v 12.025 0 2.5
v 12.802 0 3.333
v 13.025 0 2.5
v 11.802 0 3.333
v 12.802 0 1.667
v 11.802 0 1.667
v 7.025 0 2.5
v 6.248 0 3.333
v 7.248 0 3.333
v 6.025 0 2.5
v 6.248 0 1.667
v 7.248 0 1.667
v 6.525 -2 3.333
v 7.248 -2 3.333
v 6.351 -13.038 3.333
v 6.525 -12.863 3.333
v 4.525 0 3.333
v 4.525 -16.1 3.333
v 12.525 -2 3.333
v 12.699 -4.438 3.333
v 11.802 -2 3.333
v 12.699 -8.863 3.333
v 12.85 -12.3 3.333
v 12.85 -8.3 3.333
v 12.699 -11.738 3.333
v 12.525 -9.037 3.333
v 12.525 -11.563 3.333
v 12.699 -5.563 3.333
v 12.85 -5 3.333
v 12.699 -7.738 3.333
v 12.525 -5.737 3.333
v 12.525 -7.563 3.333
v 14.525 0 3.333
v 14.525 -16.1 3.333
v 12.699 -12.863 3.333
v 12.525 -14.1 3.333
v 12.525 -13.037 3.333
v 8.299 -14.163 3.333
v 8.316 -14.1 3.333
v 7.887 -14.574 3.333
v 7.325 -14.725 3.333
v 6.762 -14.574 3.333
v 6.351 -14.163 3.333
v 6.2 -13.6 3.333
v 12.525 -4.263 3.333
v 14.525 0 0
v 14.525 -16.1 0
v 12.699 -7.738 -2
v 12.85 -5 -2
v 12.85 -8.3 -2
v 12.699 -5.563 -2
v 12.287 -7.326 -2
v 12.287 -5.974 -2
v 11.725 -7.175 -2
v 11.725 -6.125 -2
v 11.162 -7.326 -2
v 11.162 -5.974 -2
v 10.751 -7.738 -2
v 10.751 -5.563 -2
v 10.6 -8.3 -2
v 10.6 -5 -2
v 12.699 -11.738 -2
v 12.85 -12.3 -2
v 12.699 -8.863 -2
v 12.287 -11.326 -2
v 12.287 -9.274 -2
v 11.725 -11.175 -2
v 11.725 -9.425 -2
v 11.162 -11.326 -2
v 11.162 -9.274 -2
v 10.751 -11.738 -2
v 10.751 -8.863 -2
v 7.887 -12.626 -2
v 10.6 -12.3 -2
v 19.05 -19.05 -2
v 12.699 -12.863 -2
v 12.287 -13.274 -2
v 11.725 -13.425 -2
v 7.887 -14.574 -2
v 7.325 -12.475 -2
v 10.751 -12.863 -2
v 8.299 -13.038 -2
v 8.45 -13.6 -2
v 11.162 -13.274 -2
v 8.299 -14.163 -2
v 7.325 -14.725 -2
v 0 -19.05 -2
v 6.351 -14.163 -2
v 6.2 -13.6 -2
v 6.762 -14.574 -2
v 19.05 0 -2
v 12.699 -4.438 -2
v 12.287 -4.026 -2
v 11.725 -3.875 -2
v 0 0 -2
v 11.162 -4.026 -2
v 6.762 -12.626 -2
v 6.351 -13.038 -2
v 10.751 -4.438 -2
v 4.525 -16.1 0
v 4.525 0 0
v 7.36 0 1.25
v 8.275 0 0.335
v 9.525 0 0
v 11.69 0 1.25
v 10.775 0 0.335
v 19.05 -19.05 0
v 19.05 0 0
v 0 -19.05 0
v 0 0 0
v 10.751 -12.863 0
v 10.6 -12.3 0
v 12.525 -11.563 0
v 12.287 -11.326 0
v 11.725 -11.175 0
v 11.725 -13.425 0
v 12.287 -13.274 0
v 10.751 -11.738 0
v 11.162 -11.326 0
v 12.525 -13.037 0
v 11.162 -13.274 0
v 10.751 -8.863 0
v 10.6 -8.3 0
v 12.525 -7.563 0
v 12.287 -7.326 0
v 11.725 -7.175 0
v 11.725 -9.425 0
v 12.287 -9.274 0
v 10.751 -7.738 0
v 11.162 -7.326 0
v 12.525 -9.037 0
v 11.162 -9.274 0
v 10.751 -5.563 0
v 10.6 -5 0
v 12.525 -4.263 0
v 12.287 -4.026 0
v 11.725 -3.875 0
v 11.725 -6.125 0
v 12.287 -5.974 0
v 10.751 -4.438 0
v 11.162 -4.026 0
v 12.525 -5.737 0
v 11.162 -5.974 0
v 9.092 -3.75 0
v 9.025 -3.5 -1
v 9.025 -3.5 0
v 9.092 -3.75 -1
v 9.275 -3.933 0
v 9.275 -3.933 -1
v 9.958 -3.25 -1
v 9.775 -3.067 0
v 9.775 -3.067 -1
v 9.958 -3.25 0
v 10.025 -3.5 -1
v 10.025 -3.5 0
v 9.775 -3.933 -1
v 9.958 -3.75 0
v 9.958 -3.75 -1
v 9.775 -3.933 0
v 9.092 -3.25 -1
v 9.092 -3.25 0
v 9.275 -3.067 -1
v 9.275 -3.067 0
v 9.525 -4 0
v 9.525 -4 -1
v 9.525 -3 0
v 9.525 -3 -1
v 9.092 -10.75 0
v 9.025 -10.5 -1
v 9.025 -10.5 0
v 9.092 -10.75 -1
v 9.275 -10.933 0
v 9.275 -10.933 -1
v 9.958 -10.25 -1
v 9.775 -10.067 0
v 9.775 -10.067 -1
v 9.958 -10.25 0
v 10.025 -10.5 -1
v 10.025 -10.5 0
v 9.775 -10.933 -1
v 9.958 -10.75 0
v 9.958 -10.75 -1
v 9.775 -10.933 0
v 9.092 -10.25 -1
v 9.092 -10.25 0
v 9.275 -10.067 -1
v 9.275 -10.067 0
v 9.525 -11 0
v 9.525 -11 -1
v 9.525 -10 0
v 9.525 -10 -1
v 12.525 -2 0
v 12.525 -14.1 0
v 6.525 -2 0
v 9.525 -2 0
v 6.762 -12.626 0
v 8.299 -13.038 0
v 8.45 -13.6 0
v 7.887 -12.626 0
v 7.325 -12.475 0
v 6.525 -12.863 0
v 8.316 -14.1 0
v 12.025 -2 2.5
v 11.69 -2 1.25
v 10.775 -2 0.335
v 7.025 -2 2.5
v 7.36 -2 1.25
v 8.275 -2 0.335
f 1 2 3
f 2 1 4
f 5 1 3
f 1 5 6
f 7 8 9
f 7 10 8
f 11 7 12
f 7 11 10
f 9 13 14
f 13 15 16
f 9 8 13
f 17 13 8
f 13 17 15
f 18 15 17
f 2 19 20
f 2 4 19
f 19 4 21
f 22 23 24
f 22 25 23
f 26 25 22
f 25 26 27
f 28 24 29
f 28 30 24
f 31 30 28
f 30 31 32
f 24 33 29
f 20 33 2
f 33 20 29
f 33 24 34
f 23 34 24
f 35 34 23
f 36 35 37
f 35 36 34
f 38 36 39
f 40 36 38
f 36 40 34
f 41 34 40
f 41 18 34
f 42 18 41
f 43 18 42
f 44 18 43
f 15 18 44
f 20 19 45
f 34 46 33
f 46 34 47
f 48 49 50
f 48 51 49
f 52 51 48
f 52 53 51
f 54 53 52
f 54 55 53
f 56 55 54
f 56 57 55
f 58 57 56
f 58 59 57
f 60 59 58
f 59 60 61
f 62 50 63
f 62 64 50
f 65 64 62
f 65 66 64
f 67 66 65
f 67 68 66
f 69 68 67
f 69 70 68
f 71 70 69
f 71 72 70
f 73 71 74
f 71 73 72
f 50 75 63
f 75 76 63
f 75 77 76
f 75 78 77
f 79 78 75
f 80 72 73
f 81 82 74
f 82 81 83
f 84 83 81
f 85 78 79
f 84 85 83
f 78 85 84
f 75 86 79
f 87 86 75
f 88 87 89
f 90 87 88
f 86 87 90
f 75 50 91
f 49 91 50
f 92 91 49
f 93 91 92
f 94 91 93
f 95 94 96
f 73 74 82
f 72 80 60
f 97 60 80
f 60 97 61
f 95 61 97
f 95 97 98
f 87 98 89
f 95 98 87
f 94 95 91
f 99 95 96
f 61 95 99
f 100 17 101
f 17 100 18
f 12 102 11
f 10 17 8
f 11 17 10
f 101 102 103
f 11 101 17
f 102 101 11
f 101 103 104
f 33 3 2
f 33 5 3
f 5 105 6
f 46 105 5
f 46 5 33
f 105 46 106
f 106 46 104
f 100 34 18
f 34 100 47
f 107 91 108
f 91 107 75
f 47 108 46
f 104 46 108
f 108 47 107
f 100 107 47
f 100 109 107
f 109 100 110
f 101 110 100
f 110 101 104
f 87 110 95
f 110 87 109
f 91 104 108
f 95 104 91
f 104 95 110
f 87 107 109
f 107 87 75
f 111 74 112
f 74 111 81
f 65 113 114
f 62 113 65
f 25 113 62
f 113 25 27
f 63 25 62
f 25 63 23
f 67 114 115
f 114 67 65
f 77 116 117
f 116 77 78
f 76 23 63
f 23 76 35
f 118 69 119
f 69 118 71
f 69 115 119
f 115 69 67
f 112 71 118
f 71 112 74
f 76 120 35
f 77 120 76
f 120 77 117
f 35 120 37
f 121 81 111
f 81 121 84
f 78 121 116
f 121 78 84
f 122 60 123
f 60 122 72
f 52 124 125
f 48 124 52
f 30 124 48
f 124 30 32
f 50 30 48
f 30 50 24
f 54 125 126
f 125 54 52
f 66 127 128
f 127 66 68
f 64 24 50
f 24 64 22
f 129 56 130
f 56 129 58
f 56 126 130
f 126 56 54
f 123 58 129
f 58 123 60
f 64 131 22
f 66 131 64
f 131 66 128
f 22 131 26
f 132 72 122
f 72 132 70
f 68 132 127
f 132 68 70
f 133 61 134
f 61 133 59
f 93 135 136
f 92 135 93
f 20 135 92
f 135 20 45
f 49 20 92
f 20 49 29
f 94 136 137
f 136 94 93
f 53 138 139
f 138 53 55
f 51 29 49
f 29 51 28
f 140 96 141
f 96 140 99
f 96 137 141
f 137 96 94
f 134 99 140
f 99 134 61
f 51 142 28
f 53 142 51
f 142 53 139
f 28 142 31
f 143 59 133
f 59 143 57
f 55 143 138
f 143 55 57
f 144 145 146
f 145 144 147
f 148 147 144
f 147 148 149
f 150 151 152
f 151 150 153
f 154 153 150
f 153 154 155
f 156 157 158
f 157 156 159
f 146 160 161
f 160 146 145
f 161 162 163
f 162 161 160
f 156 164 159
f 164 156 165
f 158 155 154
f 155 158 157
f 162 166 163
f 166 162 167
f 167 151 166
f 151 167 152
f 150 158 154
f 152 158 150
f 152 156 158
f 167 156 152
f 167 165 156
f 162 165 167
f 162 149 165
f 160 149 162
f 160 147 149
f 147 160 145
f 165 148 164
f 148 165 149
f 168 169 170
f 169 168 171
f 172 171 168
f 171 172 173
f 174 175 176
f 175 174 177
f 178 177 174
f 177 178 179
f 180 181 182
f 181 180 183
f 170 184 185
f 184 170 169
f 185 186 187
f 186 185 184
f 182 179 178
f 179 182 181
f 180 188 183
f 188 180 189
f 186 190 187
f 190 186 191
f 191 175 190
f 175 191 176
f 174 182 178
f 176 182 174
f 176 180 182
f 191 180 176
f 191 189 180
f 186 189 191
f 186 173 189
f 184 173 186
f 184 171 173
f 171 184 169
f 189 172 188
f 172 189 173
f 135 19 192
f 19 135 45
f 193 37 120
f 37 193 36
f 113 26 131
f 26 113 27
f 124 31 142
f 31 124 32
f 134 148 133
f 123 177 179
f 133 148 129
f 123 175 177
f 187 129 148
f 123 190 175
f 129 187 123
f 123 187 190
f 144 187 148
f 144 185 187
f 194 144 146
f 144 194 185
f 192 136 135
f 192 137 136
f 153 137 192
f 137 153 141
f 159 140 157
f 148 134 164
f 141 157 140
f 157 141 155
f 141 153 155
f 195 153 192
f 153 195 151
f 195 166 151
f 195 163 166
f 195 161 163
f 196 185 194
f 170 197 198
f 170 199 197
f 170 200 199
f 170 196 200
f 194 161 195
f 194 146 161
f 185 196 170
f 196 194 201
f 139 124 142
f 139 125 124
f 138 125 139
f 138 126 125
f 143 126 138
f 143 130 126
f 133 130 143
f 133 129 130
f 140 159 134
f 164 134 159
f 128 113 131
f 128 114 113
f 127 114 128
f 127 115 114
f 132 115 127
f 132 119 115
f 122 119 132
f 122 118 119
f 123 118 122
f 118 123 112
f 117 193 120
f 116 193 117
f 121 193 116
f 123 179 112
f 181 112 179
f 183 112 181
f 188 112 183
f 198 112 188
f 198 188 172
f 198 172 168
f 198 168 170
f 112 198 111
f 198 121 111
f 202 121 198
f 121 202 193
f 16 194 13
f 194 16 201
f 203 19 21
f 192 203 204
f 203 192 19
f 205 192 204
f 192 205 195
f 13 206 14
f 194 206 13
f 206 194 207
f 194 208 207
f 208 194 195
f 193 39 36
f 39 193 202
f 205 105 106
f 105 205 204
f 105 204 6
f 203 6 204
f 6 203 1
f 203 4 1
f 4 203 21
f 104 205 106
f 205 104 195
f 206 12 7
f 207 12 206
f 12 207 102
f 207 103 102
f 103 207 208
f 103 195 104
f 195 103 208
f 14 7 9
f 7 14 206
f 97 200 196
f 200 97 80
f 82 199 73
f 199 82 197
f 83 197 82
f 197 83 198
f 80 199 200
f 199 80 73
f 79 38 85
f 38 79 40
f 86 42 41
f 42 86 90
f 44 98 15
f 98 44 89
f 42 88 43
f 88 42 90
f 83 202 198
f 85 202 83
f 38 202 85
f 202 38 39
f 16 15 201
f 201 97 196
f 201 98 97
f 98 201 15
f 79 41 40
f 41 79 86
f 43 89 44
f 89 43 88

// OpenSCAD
// file: stabilizer_spacing.scad
include <parameters.scad>

// Stabilizer spacing for common key sizes, measured center-to-center
// Format is [key_size, left_offset, right_offset, switch_offset=0]
// Key size is measured in units, offsets are measured in mm from center

stab_2u = [2, 5/8*unit, 5/8*unit];  // [11.938, 11.938], 1.25u total spacing
stab_2_25u = [2.25, 5/8*unit, 5/8*unit];
stab_2_5u = [2.5, 5/8*unit, 5/8*unit];
stab_2_75u = [2.75, 5/8*unit, 5/8*unit];
stab_3u = [3, 1*unit, 1*unit];  // [19.05, 19.05], 2u total spacing
stab_6u = [6, 2.5*unit, 2.5*unit];  // [47.625, 47.625], 5u total spacing
stab_6u_offset = [6, 3*unit, 2*unit, 0.5*unit];  // [57.15, 38.1], 5u total spacing
stab_6_25u = [6.25, 2.625*unit, 2.625*unit];  // [49.8475, 49.8475], 5.25u total spacing
stab_6_25u_offset = [6.25, 3.25*unit, 2*unit, 0.625*unit];  // [61.9125, 38.1], 5.25u total spacing
stab_6_25u_narrow = [6.25, 40, 40];  // 80mm total spacing
stab_7u = [7, 3*unit, 3*unit];  // [57.15, 57.15]
// file: layout.scad
include <parameters.scad>
include <stabilizer_spacing.scad>

/* [Layout Values] */
/* Layout Format (each key):
    [
        [                                       // Location Data
            [x_location, y_location],
            key_size,
            [rotation, rotation_x, rotation_y],
        ],
        [                                       // Borders
            top_border,
            bottom_border,
            left_border,
            right_border
        ],
        extra_data                              // Extra data (depending on component type)
    ]
*/

// Keyswitch Layout
//     (extra_data = rotate_column)
base_switch_layout = [
  [[[2,0],1,[0,0,0]],[0,1,1,1],false],
  [[[1,0.13],1,[0,0,0]],[0,1,1,1],false],
  [[[3,0.13],1,[0,0,0]],[0,1,1,1],false],
  [[[4,0.25],1,[0,0,0]],[0,1,1,1],false],
  [[[0,0.38],1,[0,0,0]],[0,1,0,1],false],
  [[[2,1],1,[0,0,0]],[1,1,1,1],false],
  [[[1,1.13],1,[0,0,0]],[1,1,1,1],false],
  [[[3,1.13],1,[0,0,0]],[1,1,1,1],false],
  [[[4,1.25],1,[0,0,0]],[1,1,1,1],false],
  [[[0,1.38],1,[0,0,0]],[1,1,0,1],false],
  [[[2,2],1,[0,0,0]],[1,4,1,1],false],
  [[[1,2.13],1,[0,0,0]],[1,3,1,1],false],
  [[[3,2.13],1,[0,0,0]],[1,3,1,1],false],
  [[[4,2.25],1,[0,0,0]],[1,2,1,1],false],
  [[[0,2.38],1,[0,0,0]],[1,1,0,1],false],
  //[[[5,2.75],1,[0,0,0]],[1,2,2,1],false],
  [[[5,3.6],1,[-30,6.5,4.25]],[3.5,1,3,1],false],
  [[[4,4.6],1,[-30,6.5,4.25]],[3.5,0,3,1],false],
  [[[5,4.6],1,[-30,6.5,4.25]],[4.2,0,1,1],false],
  [[[6,4.6],1,[-30,6.5,4.25]],[1  ,0,1,0],false],
];


// MCU Position(s)
base_mcu_layout = [
    [[[5.1,0.51],1.5,[0,0,0]],[0,42.5,3,1],false],
	//[[[-4.5,1.6],1.5,[90,0,0]],[14,6,0,0],false]
];

// TRRS Position(s)
base_trrs_layout = [ 	              
   /* //[[[5,0.5],1,[0,0,0]],[0,0,0,0]], */
   [[[6.4,3.35],1,[-90,7,3]],[0,0,0,0]],
];

base_typec_layout = [ 	              
   //[[[5,0.5],1,[0,0,0]],[0,0,0,0]],
   [[[6.4,3.35],1,[-90,7,3]],[0,0,0,0]],
];

// Stabilizer layout
//     (extra_data = [key_size, left_offset, right_offset, switch_offset=0])
//     (see stabilizer_spacing.scad for presets)
base_stab_layout = [];

// Via layout
//     (extra_data = [via_width, via_length])
base_via_layout = [
    [[[4.55, 1.95]]],
    [[[4.55, 0.95]]],
    [[[4.55, 0.0]]],

    [[[4.8, 2.6]]],
];

// Plate Layout (if different than PCB)
//     (extra_data = component_type)
base_plate_layout = [];

// Whether to only use base_plate_layout to generate the plate footprint
use_plate_layout_only = false;

// Standoff layout
//     (extra_data = [standoff_integration_override, standoff_attachment_override])
base_standoff_layout = [
    [[[0.5,0.125]]], // original
    [[[0.5,2.2]]], // original
    [[[2.5,1]]], // original
    [[[4.5,0.5]]], // original
    [[[5.8,3.7]]], // original

    /* [[[0.5, 0.2]]], // new */
    /* [[[2.5, 0.0]]], // new -- */
    /* [[[4.5, 0.2]]], // new */

    /* [[[0.5, 1.3]]], // new -- */
    /* [[[2.5,1.0]]], // new -- */
    /* [[[4.5,1.3]]], // new -- */

    /* [[[0.5, 2.6]]], // new */
    /* [[[2.5,2.4]]], // new -- */
    /* [[[4.5,2.7]]], // new -- */

    /* [[[5.4, 3.8]]], // new */
    /* [[[4.0, 4.2]]], // new -- */

    // PCB-Backplate standoffs
    /* [[[-0.5,-0.375]],[0,0,0,0],["plate", "backplate"]], */
    /* [[[-0.5,0]],[0,0,0,0],["plate", "backplate"]], */
    [[[-0.5,0]],[0,0,0,0],["plate", "backplate"]],
    [[[-0.5,3]],[0,0,0,0],["plate", "backplate"]],
    [[[6.2,-0.04]],[0,0,0,0],["plate", "backplate"]],
    [[[6.2,3.5]],[0,0,0,0],["plate", "backplate"]],
    [[[3,4.1]],[0,0,0,0],["plate", "backplate"]],
    /* [[[-0.5,3.625]],[0,0,0,0],["plate", "backplate"]], */
    /* [[[4,3.625]],[0,0,0,0],["plate", "backplate"]], */
    /* [[[4.125,6.125],1.5,[60,4.875,4.625]],[0,0,0,0],["plate", "backplate"]], */
    /* [[[6.5,3]],[0,0,0,0],["plate", "backplate"]], */
    /* [[[5.5,-0.1875]],[0,0,0,0],["plate", "backplate"]], */
    /* [[[7,0]],[0,0,0,0],["plate", "backplate"]], */
];

// Whether to flip the layout
invert_layout_flag = true;

// Whether the layout is staggered-row or staggered-column
layout_type = "column";  // [column, row]
// file: default_layout.scad
include <parameters.scad>

/* [Layout Values] */
/* Layout Format (each key): 
    [
        [                                       // Location Data
            [x_location, y_location],
            key_size,
            [rotation, rotation_x, rotation_y],
        ], 
        [                                       // Borders
            top_border,
            bottom_border,
            left_border, 
            right_border
        ],
        extra_data                              // Extra data (depending on component type)
    ]
*/

// Keyswitch Layout 
//     (extra_data = rotate_column)
base_key_layout = [
    [[[0,0.125]],[0,1,0,2]],
    [[[0,1.125]],[1,1,0,1]],
    [[[0,2.125]],[1,1,0,1]],
    [[[0,3.125]],[1,0,0,0]],
    [[[1,0]],[0,1,0,0]],
    [[[1,1]]],
    [[[1,2]]],
    [[[1,3]],[1,0,2,2]],
    [[[2,0.125]],[0,1,2,2]],
    [[[2,1.125]]],
    [[[2,2.125]]],
    [[[2,3.125]],[1,0,0,0]],
    [[[3,0]],[0,1,0,0]],
    [[[3,1]]],
    [[[3,2]]],
    [[[3,3]],[1,0,2,2]],
    [[[4,0.125]],[0,1,2,0]],
    [[[4,1.125]]],
    [[[4,2.125]]],
    [[[4,3.125]],[1,0,0,0]],
    [[[5,0.25]],[0,1,2,0]],
    [[[5,1.25]]],
    [[[5,2.25]],[1,15*mm,2,1]],
    [[[4.875,4.625],1.5,[60,4.875,4.625]],[15*mm,1,0,17.15*mm],true],
    [[[4.875,5.625],1.5,[60,4.875,4.625]],[1,0,0,17.15*mm],true],
];

// MCU Position(s)
base_mcu_layout = [
    [[[6,0.5],mcu_h_unit_size],[0,0,3,0]],
];

// TRRS Position(s)
base_trrs_layout = [
    [[[6.5,2.5],1,[-90,7,3]],[0,0.5*h_unit,0,6]],
];

// Standoff layout 
//     (extra_data = [standoff_integration_override, standoff_attachment_override])
base_standoff_layout = [
    [[[0.5,0.125]]],
    [[[0.5,3]]],
    [[[2.5,1.5]]],
    [[[3.5,3]]],
    [[[4.5,0.25]]],
    [[[4.875,5.125],1.5,[60,4.875,4.625]], [0,0,0,0]],
    [[[6,2.5]]],
    [[[-0.5,-0.375]],[0,0,0,0],["plate", "backplate"]],
    [[[-0.5,3.625]],[0,0,0,0],["plate", "backplate"]],
    [[[4,3.625]],[0,0,0,0],["plate", "backplate"]],
    [[[4.375,6.125],1.5,[60,4.875,4.625]],[0,0,0,0],["plate", "backplate"]],
    [[[6.5,3]],[0,0,0,0],["plate", "backplate"]],
    [[[7,0]],[0,0,0,0],["plate", "backplate"]],
    [[[5.5,-0.125]],[0,0,0,0],["plate", "backplate"]],
];

// Whether to flip the layout
invert_layout_flag = false;

// Whether the layout is staggered-row or staggered-column
layout_type = "column";  // [column, row]
// file: utils.scad
include <parameters.scad>
include <default_layout.scad>
include <layout.scad>


// Determine whether to invert the layout
key_layout_final = invert_layout_flag 
    ? invert_layout(set_defaults(base_key_layout, false)) 
    : set_defaults(base_key_layout, false);
mcu_layout_final = invert_layout_flag 
    ? invert_layout(set_defaults(base_mcu_layout)) 
    : set_defaults(base_mcu_layout);
trrs_layout_final = invert_layout_flag 
    ? invert_layout(set_defaults(base_trrs_layout)) 
    : set_defaults(base_trrs_layout);
standoff_layout_final = invert_layout_flag 
    ? invert_layout(set_defaults(
        base_standoff_layout, 
        [standoff_integration_default,standoff_attachment_default])) 
    : set_defaults(
        base_standoff_layout, 
        [standoff_integration_default,standoff_attachment_default]);

// Moves the flat part to the top if layout is row-staggered so column wires 
// can be routed. PCB should be printed upside down in this case.
border_z_offset =
    layout_type == "column"
    ? -1
    : layout_type == "row"
        ? 1
        : assert(false, "layout_type parameter is invalid");

// Tweaks to make wire channels connect properly depending on the key alignment
row_cutout_length =
    layout_type == "column"
    ? h_unit+1
    : layout_type == "row"
        ? 1000
        : assert(false, "layout_type parameter is invalid");

col_cutout_length =
    layout_type == "column"
    ? 1000
    : layout_type == "row"
        ? v_unit+1
        : assert(false, "layout_type parameter is invalid");

switch_rotation = 
    switch_orientation == "south"
    ? 0
    : switch_orientation == "north"
        ? 180
        : assert(false, "switch_orientation is invalid");


function set_defaults(layout, extra_data_default=[]) = [
    for (item = layout)
        let(
            location = len(item[0]) == 3 
                ? item[0] 
                : len(item[0]) == 2
                    ? [item[0][0],item[0][1],[0,0,0]]
                    : [item[0][0],1,[0,0,0]],
            borders = len(item) >= 2 
                ? item[1] 
                : [1,1,1,1],
            extra_data = len(item) == 3 
                ? item[2] 
                : extra_data_default
        )
        [
            location,
            borders,
            extra_data
        ]
];

function invert_borders(borders, invert=true) = 
    invert
        ? [borders[0], borders[1], borders[3], borders[2]]
        : borders;

function invert_layout(layout) = [
    for (item = layout)
        let(
            location = item[0],
            borders = item[1],
            extra_data = item[2]
        )
        [
            [
                [-location[0][0]-location[1], location[0][1]],
                location[1],
                [-location[2][0], -location[2][1], location[2][2]],
            ],
            invert_borders(borders),
            extra_data
        ]
];
    
module layout_pattern(layout) {
    union() {
        for (item = layout) {
            location = item[0];
            $borders = item[1];
            $extra_data = item[2];

            switch_offset = (location[1]-1)/2;  // Coordinate offset based on key shape

            translate([location[2][1]*h_unit,-location[2][2]*v_unit,0]) {
                rotate([0,0,location[2][0]]) {
                    translate([(location[0][0]-location[2][1]+switch_offset)*h_unit,
                               (location[2][2]-location[0][1])*v_unit,
                               0]) {
                        children();
                    }
                }
            }
        }
    }
}

module border(base_size, borders, thickness, h_unit=1, v_unit=1) {
    translate([
        h_unit/2 * (borders[3] - borders[2]),
        v_unit/2 * (borders[0] - borders[1]),
        0
    ]) {
        cube([
            base_size[0]+h_unit*(borders[2]+borders[3])+0.001,
            base_size[1]+v_unit*(borders[0]+borders[1])+0.001,
            thickness
        ], center=true);
    }
}
// file: parameters.scad
/* PCB Properties */
// Diameter of row/column wire channels
wire_diameter = 2.15;
// Upward angle of switch pin in contact with diode anode (gives more reliable
// connections but slightly deforms pin)
diode_pin_angle = 5;  // [0:15]
// Overall thickness of PCB
pcb_thickness = 4;  // [4:0.1:10]
// Distance the plate sticks out past the PCB
plate_margin = 5;

/* Switch Properties */
// Switch type
switch_type = "mx";  // [mx, choc]
// Switch orientation (based on LED location)
switch_orientation = "south";  // [north, south]

/* MCU Properties (Default values for Pro Micro) */
mcu_type = "bare";  // [bare, socketed]
mcu_width = 18;  
mcu_length = 32.75;
mcu_height = 4.25;  // Distance to top of PCB
mcu_row_spacing = 15.24;
mcu_row_count = 2;  // Unused
mcu_pin_pitch = 2.54;
mcu_pin_count = 24;
mcu_pin_offset = 0;  // Offset from the rear of the PCB
mcu_connector_width = 10;  // Width of the connector (for plate cutout)
mcu_connector_length = 4;  // Distance the connector extends onto the MCU (for plate cutout)
mcu_pcb_thickness = 1.6;
mcu_socket_width = mcu_width+4;
mcu_socket_length = mcu_length+4;


/* TRRS Socket Properties */
trrs_width = 6;
trrs_length = 12.1; 
trrs_height = 5;
trrs_flange_length = 2;
trrs_flange_diameter = 5;
trrs_pin_spacing = 4.4;
trrs_nub_diameter = 1;  // Little locating nubs on the bottom of the socket
trrs_nub_height = 1;
trrs_nub_spacing = 7;
trrs_nub_offset = 1.5;  // Distance from the front of the socket (not including flange)


/* Standoff Properties */
// Component the standoff is integrated with
standoff_integration_default = "plate";  // [plate, backplate, pcb, separate, none]
// Component the standoff is screwed to
standoff_attachment_default = "pcb";  // [plate, backplate, pcb, plate_backplate, none]
// Diameter of integrated standoffs
standoff_diameter = 4;
// Diameter of standoff clearance hole
standoff_clearance_hole_diameter = 2.5;
// Diameter of standoff pilot hole
standoff_pilot_hole_diameter = 1.6;

/* Misc Values */
// Increase this if your standoffs are a bit too long due to printing tolerances
fit_tolerance = 0;
// Resolution of holes (affects render times)
$fn=12;

/* Advanced Values (related to switch size) */
// Switch spacing distance
unit = 19.05;
// Horizontal unit size (18mm for choc keycaps)
h_unit = unit;
// Vertical unit size (17mm for choc keycaps)
v_unit = unit;
// Spacing of grid for MX pins
grid = 1.27;
// Size of socket body
socket_size = 
    switch_type == "mx"
    ? 14
    : switch_type == "choc"
        ? 15
        : assert(false, "switch_type is invalid");
// Depth of the socket holes
socket_depth = 3.5;

module __Customizer_Limit__ () {}

// Thickness of the plate
plate_thickness = 
    switch_type == "mx"
    ? 1.5
    : switch_type == "choc"
        ? 1.3
        : assert(false, "switch_type is invalid");
// Size of the plate cutout
plate_cutout_size = 
    switch_type == "mx"
    ? 14
    : switch_type == "choc"
        ? 13.8
        : assert(false, "switch_type is invalid");
// Spacing between the top of the PCB and top of the plate
pcb_plate_spacing = 
    switch_type == "mx"
    ? 5
    : switch_type == "choc"
        ? 2.2
        : assert(false, "switch_type is invalid");

// Thickness of the backplate        
backplate_thickness = 2;
// Spacing between the bottom of the PCB and the top of the backplate
pcb_backplate_spacing = 4;

// Total assembly thickness (for reference)
total_thickness = 
    pcb_plate_spacing + pcb_thickness + pcb_backplate_spacing + backplate_thickness;
//echo(str("Total thickness is ", total_thickness, "mm."));

// Width of a border unit around the socket (for joining adjacent sockets)
border_width = (unit - socket_size)/2;
h_border_width = (h_unit - socket_size)/2;
v_border_width = (v_unit - socket_size)/2;

// Conversion factor from border width to mm (for use in layouts)
mm = 1/border_width;
h_mm = 1/h_border_width;
v_mm = 1/v_border_width;

// Align mcu to a unit
mcu_unit_resolution = .5;  // Grid size to snap to (as fractional unit)
mcu_h_unit_size = ceil(mcu_socket_width/mcu_unit_resolution/h_unit) * mcu_unit_resolution;
mcu_v_unit_size = ceil(mcu_socket_length/mcu_unit_resolution/v_unit) * mcu_unit_resolution;
// main file
include <parameters.scad>
include <utils.scad>

socket_length = trrs_length+4;
socket_width = trrs_width+4;
    

module wire_channel(length=pcb_thickness) {
    translate([0,0,-1]) cylinder(d=wire_diameter+.1,h=length+2);
}

module trrs(borders=[0,0,0,0]) {
    translate([h_unit/2,-socket_length,0])
        rotate([0,layout_type == "row"?180:0,0])
            translate([-socket_width/2,0,-pcb_thickness/2])
                uxcell_trrs(invert_borders(borders,layout_type == "row"));
}

module uxcell_trrs(borders=[0,0,0,0]) {
    difference() {
        union() {
            // Socket Base
            cube([socket_width,socket_length,pcb_thickness-2+trrs_flange_diameter*2/3]);
            translate([
                socket_width/2,
                socket_length-trrs_flange_length,
                pcb_thickness-2+trrs_flange_diameter/2
            ]) rotate([-90,0,0]) intersection() {
                cylinder(d=trrs_flange_diameter+2,trrs_flange_length);
                translate([0,0,trrs_flange_length/2]) 
                    cube([trrs_flange_diameter+2,trrs_flange_diameter/3,trrs_flange_length],center=true);
            }
            
            // Borders
            translate([socket_width/2,socket_length-v_unit/2,pcb_thickness/2-1])
                border(
                    [h_unit,v_unit], 
                    borders, 
                    pcb_thickness-2
                );
        }
        // Socket Cutout
        translate([4-trrs_flange_length,2,pcb_thickness-2]) 
            cube([trrs_width,trrs_length,trrs_height]);
        // Flange Cutout
        translate([
            socket_width/2,
            socket_length-1-trrs_flange_length,
            pcb_thickness-2+trrs_flange_diameter/2
        ]) rotate([-90,0,0]) 
            cylinder(d=trrs_flange_diameter,h=trrs_flange_length+2);
        
        // Wire Channels
        translate([(trrs_width-trrs_pin_spacing)/2+2,4-trrs_flange_length+0.5,0]) 
            wire_channel(pcb_thickness+trrs_height-3);
        for (y=[1.8,5.8,9.1]) {
            translate([(trrs_width+trrs_pin_spacing)/2+2,4-trrs_flange_length+y,0]) 
                wire_channel(pcb_thickness+trrs_height-3);
        }
        
        // Locating Pins
        for (y=[trrs_length-trrs_nub_offset,trrs_length-trrs_nub_offset-trrs_nub_spacing]) {
            translate([socket_width/2,4-trrs_flange_length+y,pcb_thickness-2-trrs_nub_height])
                cylinder(d=trrs_nub_diameter,h=pcb_thickness);
        }
    }
}

module trrs_plate_base(borders=[0,0,0,0], thickness=plate_thickness) {
    translate([h_unit/2,-v_unit/2,0])
        border(
            [h_unit,v_unit], 
            borders, 
            thickness
        );
}

module trrs_plate_cutout(thickness=plate_thickness) {
    if (switch_type == "mx") {
        // MX spacing is sufficient to fit the TRRS socket with no cutout
    } else if (switch_type == "choc") {
        translate([h_unit/2,-socket_length/2])
                border(
                    [socket_width,socket_length], 
                    [1000,0,0,0], 
                    thickness+1
                );
    } else {
        assert(false, "switch_type is invalid");
    }
}

trrs();
